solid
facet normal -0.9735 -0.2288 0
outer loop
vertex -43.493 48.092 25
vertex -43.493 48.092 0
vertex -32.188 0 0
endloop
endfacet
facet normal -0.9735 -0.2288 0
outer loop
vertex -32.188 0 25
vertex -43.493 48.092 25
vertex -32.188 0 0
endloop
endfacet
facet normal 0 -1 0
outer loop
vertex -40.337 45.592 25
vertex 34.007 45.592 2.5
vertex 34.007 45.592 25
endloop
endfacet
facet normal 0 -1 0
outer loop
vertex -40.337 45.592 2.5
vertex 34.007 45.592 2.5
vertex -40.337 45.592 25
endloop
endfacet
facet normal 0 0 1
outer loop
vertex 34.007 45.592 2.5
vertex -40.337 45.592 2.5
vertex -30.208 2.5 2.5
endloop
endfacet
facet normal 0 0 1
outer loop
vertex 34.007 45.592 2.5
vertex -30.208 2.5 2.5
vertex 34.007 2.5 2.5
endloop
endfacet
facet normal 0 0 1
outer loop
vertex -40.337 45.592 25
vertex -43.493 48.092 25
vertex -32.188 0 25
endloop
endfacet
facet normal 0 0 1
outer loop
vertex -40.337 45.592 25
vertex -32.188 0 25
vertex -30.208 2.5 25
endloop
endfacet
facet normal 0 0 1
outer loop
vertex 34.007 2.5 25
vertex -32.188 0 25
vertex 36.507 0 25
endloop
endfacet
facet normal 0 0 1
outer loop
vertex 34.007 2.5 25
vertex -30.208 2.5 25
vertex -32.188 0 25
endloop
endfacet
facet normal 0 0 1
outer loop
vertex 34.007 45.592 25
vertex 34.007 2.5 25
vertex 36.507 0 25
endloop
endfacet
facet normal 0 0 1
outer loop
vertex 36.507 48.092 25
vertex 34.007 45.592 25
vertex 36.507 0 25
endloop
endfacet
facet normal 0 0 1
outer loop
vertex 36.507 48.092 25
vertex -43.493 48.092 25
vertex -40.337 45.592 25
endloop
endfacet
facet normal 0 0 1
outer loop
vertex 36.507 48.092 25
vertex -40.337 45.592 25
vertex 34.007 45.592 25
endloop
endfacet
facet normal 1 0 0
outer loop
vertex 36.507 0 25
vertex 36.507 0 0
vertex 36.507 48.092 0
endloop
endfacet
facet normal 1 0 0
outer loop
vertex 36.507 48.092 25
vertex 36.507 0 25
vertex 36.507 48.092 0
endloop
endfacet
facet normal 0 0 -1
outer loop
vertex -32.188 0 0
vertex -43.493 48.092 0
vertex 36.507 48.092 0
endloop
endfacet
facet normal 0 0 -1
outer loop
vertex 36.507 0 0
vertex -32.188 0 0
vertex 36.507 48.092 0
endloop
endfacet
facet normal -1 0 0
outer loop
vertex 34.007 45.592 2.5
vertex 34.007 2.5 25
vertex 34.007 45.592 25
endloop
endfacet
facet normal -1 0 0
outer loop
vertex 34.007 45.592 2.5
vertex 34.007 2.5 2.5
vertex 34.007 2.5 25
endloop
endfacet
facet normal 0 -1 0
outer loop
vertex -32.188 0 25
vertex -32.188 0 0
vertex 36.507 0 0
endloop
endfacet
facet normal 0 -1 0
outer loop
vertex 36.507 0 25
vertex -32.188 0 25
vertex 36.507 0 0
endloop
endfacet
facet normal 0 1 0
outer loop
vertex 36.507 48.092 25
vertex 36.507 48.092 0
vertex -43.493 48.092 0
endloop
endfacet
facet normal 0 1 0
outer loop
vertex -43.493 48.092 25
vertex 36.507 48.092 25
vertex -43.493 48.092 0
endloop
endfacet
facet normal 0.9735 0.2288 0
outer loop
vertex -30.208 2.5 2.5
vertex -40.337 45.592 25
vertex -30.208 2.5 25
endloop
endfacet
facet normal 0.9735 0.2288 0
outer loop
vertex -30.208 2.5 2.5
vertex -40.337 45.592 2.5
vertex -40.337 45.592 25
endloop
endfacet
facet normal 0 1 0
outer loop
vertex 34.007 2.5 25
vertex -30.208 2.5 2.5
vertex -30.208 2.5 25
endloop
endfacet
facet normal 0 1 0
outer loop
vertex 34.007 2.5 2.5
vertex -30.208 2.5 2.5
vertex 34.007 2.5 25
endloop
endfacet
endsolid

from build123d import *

# Parameters (mm, degrees)
F1_DEPTH = 25
F2_T     = -2.5


with BuildPart() as f1:
    # F0 (on Top) → F1 (new body)
    with BuildSketch(Plane.XY):
        Polygon((36.507031, 48.091673), (-43.492969, 48.091673), (-32.188456, 0), (36.507031, 0), align=None)
    extrude(amount=F1_DEPTH)

    # F2
    f2_openings = [f1.faces().sort_by_distance(p)[0] for p in [
        (-0.738459, 24.655195, 25),
    ]]
    offset(amount=F2_T, openings=f2_openings)


solid = f1.part
